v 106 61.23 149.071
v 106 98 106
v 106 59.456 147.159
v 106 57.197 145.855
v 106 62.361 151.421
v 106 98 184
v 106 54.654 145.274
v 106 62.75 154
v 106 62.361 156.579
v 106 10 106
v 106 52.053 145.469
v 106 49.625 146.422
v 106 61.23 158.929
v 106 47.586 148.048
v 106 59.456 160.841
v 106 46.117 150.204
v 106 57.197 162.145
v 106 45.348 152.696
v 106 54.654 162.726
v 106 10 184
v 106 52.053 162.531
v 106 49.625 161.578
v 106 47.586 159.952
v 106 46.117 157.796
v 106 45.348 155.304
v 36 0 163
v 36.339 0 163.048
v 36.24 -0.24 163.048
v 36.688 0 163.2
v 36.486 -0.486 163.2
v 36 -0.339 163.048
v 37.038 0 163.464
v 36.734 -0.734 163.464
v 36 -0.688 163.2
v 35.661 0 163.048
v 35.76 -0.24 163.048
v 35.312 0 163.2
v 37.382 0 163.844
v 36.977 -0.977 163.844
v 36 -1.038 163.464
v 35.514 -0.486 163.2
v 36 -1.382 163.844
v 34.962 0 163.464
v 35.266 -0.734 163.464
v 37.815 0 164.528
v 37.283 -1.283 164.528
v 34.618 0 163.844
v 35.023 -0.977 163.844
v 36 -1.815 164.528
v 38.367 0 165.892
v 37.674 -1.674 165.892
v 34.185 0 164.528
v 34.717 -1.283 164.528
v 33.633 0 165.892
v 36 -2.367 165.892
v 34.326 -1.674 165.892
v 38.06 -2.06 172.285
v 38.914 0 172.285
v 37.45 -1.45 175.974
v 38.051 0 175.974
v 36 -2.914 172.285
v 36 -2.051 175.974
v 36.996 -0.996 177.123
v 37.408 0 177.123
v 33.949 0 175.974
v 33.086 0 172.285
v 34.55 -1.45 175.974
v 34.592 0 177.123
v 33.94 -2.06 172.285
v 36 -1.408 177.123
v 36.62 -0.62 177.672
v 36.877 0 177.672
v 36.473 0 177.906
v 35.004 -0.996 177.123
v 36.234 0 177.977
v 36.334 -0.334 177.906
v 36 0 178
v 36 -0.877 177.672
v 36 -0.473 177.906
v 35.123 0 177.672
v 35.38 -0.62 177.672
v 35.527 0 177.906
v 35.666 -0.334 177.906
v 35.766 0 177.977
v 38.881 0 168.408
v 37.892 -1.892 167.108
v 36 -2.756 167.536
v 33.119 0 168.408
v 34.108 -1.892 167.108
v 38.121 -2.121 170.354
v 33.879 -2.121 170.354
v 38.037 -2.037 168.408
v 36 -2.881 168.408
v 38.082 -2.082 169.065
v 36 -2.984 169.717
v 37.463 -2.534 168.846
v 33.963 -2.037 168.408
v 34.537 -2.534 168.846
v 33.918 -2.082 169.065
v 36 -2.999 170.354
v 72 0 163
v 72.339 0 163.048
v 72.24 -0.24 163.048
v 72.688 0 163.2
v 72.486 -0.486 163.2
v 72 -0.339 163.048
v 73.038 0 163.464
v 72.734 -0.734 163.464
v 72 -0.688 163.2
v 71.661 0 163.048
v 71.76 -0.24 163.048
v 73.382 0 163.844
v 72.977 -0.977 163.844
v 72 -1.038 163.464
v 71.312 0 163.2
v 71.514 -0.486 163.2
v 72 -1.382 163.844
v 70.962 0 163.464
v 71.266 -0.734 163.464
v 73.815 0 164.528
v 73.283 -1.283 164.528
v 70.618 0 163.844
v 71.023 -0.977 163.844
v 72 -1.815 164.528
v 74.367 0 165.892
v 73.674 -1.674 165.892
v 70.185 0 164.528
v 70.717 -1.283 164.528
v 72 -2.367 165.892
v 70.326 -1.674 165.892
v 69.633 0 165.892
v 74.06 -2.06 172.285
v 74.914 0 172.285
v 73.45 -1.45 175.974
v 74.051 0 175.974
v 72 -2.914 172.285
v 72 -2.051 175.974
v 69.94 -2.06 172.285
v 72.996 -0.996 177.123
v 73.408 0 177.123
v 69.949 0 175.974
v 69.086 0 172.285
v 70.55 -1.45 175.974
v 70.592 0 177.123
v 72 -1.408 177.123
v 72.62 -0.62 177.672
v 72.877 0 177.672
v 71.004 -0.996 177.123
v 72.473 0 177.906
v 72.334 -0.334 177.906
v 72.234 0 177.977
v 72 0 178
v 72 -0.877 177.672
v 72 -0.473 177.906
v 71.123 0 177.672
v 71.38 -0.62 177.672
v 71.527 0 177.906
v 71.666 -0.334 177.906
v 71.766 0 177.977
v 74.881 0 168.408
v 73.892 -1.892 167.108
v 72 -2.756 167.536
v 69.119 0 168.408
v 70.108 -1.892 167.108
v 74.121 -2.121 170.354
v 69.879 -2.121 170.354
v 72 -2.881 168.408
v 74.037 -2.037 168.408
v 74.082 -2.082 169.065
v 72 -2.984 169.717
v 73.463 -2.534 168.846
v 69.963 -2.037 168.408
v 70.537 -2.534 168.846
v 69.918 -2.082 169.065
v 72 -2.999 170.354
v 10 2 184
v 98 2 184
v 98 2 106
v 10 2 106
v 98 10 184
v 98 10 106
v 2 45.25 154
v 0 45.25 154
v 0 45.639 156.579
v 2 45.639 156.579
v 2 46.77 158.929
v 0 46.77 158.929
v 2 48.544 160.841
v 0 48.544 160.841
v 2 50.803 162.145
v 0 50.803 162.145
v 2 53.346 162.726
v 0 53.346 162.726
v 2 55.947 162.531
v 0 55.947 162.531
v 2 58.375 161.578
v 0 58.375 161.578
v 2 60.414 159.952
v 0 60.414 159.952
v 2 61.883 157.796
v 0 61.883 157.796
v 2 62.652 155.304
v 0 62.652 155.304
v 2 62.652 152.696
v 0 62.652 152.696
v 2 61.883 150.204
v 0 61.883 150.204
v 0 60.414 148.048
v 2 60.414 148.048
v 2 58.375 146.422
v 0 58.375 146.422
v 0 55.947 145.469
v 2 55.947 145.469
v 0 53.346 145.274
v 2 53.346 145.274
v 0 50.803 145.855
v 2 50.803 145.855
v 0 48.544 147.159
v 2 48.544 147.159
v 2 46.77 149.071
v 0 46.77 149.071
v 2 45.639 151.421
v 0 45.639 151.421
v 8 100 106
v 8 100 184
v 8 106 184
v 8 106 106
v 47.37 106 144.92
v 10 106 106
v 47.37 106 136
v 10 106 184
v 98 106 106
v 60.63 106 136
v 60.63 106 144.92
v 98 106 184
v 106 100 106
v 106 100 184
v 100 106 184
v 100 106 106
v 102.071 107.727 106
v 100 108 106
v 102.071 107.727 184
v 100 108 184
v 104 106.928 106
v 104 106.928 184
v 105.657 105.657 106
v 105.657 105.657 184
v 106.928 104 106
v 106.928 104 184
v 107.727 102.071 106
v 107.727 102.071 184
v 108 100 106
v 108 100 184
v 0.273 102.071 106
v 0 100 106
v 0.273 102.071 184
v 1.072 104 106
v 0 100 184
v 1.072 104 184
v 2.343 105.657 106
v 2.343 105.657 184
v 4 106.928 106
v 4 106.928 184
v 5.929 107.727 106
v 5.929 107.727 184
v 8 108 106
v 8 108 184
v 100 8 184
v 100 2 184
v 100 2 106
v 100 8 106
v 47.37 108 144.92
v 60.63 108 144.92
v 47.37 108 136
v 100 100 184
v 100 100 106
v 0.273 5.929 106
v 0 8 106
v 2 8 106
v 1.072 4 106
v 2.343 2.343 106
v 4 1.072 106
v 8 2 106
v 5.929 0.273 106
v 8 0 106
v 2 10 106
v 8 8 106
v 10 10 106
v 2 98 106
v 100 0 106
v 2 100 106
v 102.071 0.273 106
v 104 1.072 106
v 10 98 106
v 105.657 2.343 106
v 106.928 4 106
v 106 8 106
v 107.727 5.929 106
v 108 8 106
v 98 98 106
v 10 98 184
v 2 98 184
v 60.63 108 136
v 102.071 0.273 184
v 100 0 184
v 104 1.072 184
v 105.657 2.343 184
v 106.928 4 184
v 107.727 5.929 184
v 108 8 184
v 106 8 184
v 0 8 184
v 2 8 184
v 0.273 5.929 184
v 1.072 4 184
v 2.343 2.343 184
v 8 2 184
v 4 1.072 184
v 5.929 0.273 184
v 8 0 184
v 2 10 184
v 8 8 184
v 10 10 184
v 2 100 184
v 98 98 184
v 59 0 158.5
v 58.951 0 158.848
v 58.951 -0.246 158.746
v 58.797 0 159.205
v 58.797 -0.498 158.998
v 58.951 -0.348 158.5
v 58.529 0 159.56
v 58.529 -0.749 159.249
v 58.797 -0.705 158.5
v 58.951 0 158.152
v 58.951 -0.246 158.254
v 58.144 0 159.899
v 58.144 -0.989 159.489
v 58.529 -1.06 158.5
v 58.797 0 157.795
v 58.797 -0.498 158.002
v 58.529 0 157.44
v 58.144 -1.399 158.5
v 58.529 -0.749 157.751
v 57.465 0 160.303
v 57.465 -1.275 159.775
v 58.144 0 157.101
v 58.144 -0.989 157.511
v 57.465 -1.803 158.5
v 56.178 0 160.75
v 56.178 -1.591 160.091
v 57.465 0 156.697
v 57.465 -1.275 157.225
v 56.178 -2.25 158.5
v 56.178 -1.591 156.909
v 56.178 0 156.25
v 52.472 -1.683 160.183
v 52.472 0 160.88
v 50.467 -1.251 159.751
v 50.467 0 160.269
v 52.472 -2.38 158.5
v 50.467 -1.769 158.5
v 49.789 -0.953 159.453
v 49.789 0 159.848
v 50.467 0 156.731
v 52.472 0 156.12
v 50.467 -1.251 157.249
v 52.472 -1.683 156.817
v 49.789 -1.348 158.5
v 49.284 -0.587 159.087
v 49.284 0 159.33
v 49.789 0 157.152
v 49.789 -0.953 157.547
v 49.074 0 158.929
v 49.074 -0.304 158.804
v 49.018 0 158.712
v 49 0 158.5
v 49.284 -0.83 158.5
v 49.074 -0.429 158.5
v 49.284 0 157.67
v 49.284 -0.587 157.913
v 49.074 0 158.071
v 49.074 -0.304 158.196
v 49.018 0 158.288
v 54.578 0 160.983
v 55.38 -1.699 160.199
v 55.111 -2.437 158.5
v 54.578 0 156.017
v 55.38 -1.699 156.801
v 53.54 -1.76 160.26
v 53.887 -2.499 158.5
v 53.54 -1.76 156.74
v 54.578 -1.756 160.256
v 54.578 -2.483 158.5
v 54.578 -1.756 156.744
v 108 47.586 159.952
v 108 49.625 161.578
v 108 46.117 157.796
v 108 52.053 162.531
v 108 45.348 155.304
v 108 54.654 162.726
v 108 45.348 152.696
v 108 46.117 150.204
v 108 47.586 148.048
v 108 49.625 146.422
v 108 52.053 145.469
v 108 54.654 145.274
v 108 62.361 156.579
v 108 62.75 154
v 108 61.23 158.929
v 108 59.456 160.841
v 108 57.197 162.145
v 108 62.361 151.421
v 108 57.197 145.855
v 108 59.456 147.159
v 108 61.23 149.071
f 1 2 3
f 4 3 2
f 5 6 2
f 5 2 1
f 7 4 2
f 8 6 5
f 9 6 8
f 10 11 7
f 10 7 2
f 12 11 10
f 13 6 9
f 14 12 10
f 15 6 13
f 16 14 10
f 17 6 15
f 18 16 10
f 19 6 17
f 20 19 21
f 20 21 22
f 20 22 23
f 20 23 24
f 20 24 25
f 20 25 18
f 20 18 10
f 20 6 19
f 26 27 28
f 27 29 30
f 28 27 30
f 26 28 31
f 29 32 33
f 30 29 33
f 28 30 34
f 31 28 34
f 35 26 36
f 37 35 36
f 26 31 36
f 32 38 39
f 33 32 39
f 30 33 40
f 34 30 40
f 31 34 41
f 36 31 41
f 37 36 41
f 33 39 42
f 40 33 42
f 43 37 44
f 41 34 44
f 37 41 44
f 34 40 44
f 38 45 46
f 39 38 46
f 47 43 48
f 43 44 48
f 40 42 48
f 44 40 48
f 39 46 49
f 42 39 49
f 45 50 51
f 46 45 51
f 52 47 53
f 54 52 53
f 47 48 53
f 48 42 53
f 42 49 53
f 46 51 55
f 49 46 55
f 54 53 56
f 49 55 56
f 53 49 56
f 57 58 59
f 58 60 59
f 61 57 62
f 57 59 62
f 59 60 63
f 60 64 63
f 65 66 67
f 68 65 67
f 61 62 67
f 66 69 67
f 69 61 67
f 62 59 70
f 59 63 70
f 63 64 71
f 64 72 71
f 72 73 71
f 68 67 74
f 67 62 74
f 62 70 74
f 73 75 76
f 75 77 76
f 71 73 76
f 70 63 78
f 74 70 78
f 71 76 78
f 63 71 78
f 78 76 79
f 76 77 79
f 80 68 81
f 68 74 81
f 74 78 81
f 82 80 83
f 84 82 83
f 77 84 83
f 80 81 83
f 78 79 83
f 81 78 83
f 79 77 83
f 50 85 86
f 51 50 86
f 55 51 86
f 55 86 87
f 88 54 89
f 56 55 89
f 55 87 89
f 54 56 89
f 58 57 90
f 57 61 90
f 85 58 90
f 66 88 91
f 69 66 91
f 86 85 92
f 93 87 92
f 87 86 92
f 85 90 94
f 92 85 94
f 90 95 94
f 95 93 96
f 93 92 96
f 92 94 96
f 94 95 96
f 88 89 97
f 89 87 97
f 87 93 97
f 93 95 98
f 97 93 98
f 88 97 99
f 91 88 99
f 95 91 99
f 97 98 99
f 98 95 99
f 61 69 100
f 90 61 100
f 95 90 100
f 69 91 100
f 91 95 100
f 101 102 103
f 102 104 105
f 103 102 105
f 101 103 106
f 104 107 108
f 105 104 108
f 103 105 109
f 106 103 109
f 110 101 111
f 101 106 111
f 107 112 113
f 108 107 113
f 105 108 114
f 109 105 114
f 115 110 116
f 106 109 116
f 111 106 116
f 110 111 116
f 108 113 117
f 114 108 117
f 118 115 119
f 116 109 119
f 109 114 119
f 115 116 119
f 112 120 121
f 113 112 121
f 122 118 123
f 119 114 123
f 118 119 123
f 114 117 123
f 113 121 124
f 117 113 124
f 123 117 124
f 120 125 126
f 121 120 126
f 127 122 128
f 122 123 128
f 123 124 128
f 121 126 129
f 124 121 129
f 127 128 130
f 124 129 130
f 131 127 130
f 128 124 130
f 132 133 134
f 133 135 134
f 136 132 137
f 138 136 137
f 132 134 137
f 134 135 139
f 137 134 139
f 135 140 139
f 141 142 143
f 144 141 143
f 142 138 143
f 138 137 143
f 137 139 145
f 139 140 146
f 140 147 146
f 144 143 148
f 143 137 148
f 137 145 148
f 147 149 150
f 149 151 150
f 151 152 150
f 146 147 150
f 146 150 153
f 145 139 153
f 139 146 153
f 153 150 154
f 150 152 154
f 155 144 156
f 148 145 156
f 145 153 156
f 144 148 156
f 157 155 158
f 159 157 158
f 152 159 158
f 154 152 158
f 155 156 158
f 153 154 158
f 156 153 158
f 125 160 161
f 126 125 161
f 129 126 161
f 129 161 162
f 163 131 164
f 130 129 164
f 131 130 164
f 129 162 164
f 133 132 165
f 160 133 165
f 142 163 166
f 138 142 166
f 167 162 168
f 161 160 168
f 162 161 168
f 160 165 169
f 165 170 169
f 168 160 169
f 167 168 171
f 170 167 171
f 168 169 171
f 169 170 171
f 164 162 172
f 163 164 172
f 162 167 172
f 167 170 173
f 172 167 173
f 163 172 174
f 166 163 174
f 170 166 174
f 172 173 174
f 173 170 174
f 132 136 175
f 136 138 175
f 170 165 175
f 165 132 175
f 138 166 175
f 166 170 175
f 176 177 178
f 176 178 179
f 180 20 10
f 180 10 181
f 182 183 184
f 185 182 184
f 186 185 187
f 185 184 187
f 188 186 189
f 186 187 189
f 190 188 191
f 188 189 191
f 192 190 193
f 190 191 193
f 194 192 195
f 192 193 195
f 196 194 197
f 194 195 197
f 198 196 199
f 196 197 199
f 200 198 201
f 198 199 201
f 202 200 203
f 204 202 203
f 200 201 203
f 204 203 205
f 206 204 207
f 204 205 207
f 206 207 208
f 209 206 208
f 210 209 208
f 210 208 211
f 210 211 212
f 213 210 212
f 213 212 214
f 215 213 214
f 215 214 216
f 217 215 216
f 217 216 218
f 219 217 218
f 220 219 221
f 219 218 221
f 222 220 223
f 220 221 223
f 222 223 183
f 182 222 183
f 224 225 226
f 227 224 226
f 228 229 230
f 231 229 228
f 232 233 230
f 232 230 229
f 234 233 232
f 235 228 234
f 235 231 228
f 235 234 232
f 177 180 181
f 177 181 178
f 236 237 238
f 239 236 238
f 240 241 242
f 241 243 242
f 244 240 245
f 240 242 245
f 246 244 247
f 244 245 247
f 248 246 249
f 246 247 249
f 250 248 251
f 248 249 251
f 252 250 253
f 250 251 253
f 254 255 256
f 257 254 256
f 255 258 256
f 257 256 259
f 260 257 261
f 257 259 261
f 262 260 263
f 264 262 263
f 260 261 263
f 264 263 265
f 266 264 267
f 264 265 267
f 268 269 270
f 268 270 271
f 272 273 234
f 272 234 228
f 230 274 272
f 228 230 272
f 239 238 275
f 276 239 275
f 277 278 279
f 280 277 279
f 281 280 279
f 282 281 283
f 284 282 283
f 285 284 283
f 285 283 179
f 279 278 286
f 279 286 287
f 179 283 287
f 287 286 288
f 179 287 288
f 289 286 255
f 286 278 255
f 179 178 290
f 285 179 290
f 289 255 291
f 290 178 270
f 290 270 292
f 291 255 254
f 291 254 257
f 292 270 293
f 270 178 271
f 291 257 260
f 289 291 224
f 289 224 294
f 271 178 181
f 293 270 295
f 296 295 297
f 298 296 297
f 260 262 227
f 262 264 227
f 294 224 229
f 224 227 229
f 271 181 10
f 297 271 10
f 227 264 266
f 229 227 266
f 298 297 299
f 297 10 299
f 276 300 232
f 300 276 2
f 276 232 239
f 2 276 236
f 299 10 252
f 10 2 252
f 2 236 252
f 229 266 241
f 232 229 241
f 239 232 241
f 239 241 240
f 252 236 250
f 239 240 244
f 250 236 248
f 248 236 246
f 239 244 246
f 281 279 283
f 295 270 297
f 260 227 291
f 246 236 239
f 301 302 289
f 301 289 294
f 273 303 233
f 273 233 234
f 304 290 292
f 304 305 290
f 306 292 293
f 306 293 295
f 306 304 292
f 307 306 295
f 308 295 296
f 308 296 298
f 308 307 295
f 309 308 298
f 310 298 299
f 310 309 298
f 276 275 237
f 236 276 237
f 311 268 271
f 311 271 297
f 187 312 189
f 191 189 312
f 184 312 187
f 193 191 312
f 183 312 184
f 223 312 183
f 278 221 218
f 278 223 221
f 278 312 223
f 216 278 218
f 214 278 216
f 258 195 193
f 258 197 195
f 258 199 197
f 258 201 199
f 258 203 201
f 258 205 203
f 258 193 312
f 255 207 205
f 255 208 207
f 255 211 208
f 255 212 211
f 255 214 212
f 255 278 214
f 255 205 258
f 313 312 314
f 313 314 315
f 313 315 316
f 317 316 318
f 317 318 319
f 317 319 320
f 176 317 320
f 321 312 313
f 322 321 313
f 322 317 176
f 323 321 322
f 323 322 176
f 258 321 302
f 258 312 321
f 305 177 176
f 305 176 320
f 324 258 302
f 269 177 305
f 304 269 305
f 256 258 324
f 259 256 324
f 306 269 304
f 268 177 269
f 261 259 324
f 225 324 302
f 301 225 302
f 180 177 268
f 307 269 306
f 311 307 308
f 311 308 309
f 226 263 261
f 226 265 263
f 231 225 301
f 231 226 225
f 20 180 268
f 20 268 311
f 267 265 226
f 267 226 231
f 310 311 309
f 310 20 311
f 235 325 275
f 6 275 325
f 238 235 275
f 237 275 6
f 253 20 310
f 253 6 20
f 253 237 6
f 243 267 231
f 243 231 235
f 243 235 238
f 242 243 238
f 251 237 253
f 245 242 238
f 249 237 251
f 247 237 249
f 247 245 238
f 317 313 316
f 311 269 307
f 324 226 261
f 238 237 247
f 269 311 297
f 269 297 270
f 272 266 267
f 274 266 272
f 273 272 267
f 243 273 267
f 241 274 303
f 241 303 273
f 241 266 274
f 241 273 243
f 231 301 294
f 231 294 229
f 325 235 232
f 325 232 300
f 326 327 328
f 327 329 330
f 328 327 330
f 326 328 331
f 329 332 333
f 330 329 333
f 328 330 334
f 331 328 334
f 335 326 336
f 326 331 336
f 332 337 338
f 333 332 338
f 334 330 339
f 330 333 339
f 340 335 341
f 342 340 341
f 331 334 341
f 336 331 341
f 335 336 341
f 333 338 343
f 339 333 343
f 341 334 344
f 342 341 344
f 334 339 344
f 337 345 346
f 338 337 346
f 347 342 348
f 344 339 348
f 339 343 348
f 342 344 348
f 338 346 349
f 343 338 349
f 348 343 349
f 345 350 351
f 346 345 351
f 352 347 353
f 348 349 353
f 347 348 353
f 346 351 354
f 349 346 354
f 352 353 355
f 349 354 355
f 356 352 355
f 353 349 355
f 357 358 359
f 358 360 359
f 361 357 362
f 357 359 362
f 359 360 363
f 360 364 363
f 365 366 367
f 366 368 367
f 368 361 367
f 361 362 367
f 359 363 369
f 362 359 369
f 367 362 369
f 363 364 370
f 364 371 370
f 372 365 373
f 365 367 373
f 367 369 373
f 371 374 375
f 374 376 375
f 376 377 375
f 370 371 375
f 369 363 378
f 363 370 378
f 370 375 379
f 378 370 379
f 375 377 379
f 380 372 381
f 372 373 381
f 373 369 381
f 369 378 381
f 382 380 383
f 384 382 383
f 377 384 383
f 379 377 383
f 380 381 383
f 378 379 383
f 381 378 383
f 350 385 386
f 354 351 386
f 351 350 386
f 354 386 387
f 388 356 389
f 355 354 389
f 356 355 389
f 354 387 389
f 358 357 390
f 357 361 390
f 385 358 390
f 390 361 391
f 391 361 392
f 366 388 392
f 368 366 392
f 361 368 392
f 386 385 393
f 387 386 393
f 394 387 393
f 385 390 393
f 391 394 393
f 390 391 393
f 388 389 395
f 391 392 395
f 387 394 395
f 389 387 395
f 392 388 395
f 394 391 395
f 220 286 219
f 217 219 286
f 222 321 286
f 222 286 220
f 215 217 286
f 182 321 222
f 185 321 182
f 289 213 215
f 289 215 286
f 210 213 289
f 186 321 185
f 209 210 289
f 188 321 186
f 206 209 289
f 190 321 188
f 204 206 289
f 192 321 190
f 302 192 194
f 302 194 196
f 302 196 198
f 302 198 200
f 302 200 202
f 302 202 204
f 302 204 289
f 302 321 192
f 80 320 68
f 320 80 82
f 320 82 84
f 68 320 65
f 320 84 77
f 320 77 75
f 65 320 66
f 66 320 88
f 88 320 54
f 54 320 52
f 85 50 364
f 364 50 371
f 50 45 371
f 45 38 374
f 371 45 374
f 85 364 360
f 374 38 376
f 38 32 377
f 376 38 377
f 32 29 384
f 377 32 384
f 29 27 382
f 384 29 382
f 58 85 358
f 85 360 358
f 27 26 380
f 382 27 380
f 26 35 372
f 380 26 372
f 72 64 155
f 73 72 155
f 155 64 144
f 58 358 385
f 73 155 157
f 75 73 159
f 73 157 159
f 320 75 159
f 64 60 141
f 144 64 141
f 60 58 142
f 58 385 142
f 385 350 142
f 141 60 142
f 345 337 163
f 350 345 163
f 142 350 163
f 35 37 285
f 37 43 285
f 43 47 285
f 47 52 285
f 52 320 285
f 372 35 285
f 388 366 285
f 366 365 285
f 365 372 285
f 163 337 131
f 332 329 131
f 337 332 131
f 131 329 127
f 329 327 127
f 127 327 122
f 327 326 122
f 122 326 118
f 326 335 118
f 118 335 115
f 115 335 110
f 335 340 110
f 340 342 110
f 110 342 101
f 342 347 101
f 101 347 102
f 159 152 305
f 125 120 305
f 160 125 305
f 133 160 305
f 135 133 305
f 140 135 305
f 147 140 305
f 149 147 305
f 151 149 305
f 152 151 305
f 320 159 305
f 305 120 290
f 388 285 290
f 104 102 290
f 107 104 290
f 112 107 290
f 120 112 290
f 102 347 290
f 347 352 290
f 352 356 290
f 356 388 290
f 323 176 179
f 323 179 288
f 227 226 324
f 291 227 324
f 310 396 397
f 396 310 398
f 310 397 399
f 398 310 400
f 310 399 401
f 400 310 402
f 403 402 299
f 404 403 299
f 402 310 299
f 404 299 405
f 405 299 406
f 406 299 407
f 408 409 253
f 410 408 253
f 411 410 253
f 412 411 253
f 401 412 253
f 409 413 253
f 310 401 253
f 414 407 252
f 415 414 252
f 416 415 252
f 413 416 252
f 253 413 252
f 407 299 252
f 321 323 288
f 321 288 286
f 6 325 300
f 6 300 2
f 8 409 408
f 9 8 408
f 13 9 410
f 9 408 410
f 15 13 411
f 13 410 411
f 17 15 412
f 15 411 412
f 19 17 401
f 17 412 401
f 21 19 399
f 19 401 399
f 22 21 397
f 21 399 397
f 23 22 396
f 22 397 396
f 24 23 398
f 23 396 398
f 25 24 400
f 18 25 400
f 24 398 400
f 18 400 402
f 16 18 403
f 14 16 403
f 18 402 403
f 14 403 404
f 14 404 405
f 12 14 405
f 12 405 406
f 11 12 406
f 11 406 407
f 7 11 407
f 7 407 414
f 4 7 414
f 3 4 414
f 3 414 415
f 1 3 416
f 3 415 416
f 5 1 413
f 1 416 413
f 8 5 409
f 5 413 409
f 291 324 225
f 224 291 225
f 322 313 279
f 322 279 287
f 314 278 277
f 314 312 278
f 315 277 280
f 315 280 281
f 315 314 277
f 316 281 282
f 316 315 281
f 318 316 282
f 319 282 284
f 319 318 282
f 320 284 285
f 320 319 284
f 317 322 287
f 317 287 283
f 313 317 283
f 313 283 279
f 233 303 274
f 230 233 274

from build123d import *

# Parameters (mm, degrees)
SKETCH087_W         = 108
SKETCH087_H         = 108
PAD038_DEPTH        = 78
POCKET039_DEPTH     = 78.001
FILLET006_R         = 8
POCKET043_DEPTH     = 78.001
REVOLUTION017_ANGLE = -180
REVOLUTION018_ANGLE = -180
REVOLUTION019_ANGLE = -180
SKETCH119_W         = 13.26
SKETCH119_H         = 8.92
POCKET059_DEPTH     = 2
SKETCH156_R         = 8.75
POCKET060_DEPTH     = 2
SKETCH157_R         = 8.75
POCKET061_DEPTH     = 2


with BuildPart() as part:
    # Sketch087 → Pad038 (new body)
    with BuildSketch(Plane.XY):
        with Locations((54, 54)):
            Rectangle(SKETCH087_W, SKETCH087_H)
    extrude(amount=PAD038_DEPTH)

    # Sketch107 (on Face6 of Pad038) → Pocket039 (cut, through all)
    with BuildSketch(Plane.XY.offset(78)):
        Polygon((2, 98), (10, 98), (10, 106), (98, 106), (98, 98), (106, 98), (106, 10), (98, 10), (98, 2), (10, 2), (10, 10), (2, 10), align=None)
    extrude(amount=-POCKET039_DEPTH, mode=Mode.SUBTRACT)

    # Fillet006
    fillet006_edges = [part.edges().sort_by_distance(p)[0] for p in [
        (0, 108, 39),
        (108, 108, 39),
        (108, 0, 39),
        (0, 0, 39),
    ]]
    fillet(fillet006_edges, radius=FILLET006_R)

    # Sketch115 (on Face5 of Fillet006) → Pocket043 (cut, through all)
    with BuildSketch(Plane.XY.offset(78)):
        Polygon((2, 100), (8, 100), (8, 106), align=None)
        Polygon((100, 106), (100, 100), (106, 100), align=None)
        Polygon((100, 2), (100, 8), (106, 8), align=None)
        Polygon((2, 8), (8, 8), (8, 2), align=None)
    extrude(amount=-POCKET043_DEPTH, mode=Mode.SUBTRACT)

    # Sketch116 → Revolution017 (revolve)
    with BuildSketch(Plane.XZ):
        with BuildLine():
            add(Edge.make_bspline(
                [(36, 57), (39, 57), (39, 64.5), (39, 72), (36, 72)],
                knots=[0, 0, 0, 1.570796, 1.570796, 3.141593, 3.141593, 3.141593], degree=2, weights=[1, 0.707107, 1, 0.707107, 1]))
            Line((36, 72), (36, 57))
        make_face()
    revolve(axis=Axis((36, 0, 57), (0, 0, 1)), revolution_arc=REVOLUTION017_ANGLE)

    # Sketch117 → Revolution018 (revolve)
    with BuildSketch(Plane.XZ):
        with BuildLine():
            add(Edge.make_bspline(
                [(72, 57), (75, 57), (75, 64.5), (75, 72), (72, 72)],
                knots=[0, 0, 0, 1.570796, 1.570796, 3.141593, 3.141593, 3.141593], degree=2, weights=[1, 0.707107, 1, 0.707107, 1]))
            Line((72, 72), (72, 57))
        make_face()
    revolve(axis=Axis((72, 0, 57), (0, 0, 1)), revolution_arc=REVOLUTION018_ANGLE)

    # Sketch118 → Revolution019 (revolve)
    with BuildSketch(Plane.XZ):
        with BuildLine():
            add(Edge.make_bspline(
                [(59, 52.5), (59, 55), (54, 55), (49, 55), (49, 52.5)],
                knots=[0, 0, 0, 1.570796, 1.570796, 3.141593, 3.141593, 3.141593], degree=2, weights=[1, 0.707107, 1, 0.707107, 1]))
            Line((49, 52.5), (59, 52.5))
        make_face()
    revolve(axis=Axis((59, 0, 52.5), (-1, 0, 0)), revolution_arc=REVOLUTION019_ANGLE)

    # Sketch119 → Pocket059 (cut)
    with BuildSketch(Plane(origin=(0, 108, 0), x_dir=(-1, 0, 0), z_dir=(0, 1, 0))):
        with Locations((-54, 34.46)):
            Rectangle(SKETCH119_W, SKETCH119_H)
    extrude(amount=-POCKET059_DEPTH, mode=Mode.SUBTRACT)

    # Sketch156 (on Face6 of Pocket059) → Pocket060 (cut)
    with BuildSketch(Plane.YZ.offset(108)):
        with Locations((54, 48)):
            Circle(SKETCH156_R)
    extrude(amount=-POCKET060_DEPTH, mode=Mode.SUBTRACT)

    # Sketch157 (on Face5 of Pocket060) → Pocket061 (cut)
    with BuildSketch(Plane(origin=(0, 0, 0), x_dir=(0, -1, 0), z_dir=(-1, 0, 0))):
        with Locations((-54, 48)):
            Circle(SKETCH157_R)
    extrude(amount=-POCKET061_DEPTH, mode=Mode.SUBTRACT)


with BuildPart() as part_1:
    # Body015 placement: moved
    add(part.part.moved(Location((0, 0, 106))))


solid = part_1.part
